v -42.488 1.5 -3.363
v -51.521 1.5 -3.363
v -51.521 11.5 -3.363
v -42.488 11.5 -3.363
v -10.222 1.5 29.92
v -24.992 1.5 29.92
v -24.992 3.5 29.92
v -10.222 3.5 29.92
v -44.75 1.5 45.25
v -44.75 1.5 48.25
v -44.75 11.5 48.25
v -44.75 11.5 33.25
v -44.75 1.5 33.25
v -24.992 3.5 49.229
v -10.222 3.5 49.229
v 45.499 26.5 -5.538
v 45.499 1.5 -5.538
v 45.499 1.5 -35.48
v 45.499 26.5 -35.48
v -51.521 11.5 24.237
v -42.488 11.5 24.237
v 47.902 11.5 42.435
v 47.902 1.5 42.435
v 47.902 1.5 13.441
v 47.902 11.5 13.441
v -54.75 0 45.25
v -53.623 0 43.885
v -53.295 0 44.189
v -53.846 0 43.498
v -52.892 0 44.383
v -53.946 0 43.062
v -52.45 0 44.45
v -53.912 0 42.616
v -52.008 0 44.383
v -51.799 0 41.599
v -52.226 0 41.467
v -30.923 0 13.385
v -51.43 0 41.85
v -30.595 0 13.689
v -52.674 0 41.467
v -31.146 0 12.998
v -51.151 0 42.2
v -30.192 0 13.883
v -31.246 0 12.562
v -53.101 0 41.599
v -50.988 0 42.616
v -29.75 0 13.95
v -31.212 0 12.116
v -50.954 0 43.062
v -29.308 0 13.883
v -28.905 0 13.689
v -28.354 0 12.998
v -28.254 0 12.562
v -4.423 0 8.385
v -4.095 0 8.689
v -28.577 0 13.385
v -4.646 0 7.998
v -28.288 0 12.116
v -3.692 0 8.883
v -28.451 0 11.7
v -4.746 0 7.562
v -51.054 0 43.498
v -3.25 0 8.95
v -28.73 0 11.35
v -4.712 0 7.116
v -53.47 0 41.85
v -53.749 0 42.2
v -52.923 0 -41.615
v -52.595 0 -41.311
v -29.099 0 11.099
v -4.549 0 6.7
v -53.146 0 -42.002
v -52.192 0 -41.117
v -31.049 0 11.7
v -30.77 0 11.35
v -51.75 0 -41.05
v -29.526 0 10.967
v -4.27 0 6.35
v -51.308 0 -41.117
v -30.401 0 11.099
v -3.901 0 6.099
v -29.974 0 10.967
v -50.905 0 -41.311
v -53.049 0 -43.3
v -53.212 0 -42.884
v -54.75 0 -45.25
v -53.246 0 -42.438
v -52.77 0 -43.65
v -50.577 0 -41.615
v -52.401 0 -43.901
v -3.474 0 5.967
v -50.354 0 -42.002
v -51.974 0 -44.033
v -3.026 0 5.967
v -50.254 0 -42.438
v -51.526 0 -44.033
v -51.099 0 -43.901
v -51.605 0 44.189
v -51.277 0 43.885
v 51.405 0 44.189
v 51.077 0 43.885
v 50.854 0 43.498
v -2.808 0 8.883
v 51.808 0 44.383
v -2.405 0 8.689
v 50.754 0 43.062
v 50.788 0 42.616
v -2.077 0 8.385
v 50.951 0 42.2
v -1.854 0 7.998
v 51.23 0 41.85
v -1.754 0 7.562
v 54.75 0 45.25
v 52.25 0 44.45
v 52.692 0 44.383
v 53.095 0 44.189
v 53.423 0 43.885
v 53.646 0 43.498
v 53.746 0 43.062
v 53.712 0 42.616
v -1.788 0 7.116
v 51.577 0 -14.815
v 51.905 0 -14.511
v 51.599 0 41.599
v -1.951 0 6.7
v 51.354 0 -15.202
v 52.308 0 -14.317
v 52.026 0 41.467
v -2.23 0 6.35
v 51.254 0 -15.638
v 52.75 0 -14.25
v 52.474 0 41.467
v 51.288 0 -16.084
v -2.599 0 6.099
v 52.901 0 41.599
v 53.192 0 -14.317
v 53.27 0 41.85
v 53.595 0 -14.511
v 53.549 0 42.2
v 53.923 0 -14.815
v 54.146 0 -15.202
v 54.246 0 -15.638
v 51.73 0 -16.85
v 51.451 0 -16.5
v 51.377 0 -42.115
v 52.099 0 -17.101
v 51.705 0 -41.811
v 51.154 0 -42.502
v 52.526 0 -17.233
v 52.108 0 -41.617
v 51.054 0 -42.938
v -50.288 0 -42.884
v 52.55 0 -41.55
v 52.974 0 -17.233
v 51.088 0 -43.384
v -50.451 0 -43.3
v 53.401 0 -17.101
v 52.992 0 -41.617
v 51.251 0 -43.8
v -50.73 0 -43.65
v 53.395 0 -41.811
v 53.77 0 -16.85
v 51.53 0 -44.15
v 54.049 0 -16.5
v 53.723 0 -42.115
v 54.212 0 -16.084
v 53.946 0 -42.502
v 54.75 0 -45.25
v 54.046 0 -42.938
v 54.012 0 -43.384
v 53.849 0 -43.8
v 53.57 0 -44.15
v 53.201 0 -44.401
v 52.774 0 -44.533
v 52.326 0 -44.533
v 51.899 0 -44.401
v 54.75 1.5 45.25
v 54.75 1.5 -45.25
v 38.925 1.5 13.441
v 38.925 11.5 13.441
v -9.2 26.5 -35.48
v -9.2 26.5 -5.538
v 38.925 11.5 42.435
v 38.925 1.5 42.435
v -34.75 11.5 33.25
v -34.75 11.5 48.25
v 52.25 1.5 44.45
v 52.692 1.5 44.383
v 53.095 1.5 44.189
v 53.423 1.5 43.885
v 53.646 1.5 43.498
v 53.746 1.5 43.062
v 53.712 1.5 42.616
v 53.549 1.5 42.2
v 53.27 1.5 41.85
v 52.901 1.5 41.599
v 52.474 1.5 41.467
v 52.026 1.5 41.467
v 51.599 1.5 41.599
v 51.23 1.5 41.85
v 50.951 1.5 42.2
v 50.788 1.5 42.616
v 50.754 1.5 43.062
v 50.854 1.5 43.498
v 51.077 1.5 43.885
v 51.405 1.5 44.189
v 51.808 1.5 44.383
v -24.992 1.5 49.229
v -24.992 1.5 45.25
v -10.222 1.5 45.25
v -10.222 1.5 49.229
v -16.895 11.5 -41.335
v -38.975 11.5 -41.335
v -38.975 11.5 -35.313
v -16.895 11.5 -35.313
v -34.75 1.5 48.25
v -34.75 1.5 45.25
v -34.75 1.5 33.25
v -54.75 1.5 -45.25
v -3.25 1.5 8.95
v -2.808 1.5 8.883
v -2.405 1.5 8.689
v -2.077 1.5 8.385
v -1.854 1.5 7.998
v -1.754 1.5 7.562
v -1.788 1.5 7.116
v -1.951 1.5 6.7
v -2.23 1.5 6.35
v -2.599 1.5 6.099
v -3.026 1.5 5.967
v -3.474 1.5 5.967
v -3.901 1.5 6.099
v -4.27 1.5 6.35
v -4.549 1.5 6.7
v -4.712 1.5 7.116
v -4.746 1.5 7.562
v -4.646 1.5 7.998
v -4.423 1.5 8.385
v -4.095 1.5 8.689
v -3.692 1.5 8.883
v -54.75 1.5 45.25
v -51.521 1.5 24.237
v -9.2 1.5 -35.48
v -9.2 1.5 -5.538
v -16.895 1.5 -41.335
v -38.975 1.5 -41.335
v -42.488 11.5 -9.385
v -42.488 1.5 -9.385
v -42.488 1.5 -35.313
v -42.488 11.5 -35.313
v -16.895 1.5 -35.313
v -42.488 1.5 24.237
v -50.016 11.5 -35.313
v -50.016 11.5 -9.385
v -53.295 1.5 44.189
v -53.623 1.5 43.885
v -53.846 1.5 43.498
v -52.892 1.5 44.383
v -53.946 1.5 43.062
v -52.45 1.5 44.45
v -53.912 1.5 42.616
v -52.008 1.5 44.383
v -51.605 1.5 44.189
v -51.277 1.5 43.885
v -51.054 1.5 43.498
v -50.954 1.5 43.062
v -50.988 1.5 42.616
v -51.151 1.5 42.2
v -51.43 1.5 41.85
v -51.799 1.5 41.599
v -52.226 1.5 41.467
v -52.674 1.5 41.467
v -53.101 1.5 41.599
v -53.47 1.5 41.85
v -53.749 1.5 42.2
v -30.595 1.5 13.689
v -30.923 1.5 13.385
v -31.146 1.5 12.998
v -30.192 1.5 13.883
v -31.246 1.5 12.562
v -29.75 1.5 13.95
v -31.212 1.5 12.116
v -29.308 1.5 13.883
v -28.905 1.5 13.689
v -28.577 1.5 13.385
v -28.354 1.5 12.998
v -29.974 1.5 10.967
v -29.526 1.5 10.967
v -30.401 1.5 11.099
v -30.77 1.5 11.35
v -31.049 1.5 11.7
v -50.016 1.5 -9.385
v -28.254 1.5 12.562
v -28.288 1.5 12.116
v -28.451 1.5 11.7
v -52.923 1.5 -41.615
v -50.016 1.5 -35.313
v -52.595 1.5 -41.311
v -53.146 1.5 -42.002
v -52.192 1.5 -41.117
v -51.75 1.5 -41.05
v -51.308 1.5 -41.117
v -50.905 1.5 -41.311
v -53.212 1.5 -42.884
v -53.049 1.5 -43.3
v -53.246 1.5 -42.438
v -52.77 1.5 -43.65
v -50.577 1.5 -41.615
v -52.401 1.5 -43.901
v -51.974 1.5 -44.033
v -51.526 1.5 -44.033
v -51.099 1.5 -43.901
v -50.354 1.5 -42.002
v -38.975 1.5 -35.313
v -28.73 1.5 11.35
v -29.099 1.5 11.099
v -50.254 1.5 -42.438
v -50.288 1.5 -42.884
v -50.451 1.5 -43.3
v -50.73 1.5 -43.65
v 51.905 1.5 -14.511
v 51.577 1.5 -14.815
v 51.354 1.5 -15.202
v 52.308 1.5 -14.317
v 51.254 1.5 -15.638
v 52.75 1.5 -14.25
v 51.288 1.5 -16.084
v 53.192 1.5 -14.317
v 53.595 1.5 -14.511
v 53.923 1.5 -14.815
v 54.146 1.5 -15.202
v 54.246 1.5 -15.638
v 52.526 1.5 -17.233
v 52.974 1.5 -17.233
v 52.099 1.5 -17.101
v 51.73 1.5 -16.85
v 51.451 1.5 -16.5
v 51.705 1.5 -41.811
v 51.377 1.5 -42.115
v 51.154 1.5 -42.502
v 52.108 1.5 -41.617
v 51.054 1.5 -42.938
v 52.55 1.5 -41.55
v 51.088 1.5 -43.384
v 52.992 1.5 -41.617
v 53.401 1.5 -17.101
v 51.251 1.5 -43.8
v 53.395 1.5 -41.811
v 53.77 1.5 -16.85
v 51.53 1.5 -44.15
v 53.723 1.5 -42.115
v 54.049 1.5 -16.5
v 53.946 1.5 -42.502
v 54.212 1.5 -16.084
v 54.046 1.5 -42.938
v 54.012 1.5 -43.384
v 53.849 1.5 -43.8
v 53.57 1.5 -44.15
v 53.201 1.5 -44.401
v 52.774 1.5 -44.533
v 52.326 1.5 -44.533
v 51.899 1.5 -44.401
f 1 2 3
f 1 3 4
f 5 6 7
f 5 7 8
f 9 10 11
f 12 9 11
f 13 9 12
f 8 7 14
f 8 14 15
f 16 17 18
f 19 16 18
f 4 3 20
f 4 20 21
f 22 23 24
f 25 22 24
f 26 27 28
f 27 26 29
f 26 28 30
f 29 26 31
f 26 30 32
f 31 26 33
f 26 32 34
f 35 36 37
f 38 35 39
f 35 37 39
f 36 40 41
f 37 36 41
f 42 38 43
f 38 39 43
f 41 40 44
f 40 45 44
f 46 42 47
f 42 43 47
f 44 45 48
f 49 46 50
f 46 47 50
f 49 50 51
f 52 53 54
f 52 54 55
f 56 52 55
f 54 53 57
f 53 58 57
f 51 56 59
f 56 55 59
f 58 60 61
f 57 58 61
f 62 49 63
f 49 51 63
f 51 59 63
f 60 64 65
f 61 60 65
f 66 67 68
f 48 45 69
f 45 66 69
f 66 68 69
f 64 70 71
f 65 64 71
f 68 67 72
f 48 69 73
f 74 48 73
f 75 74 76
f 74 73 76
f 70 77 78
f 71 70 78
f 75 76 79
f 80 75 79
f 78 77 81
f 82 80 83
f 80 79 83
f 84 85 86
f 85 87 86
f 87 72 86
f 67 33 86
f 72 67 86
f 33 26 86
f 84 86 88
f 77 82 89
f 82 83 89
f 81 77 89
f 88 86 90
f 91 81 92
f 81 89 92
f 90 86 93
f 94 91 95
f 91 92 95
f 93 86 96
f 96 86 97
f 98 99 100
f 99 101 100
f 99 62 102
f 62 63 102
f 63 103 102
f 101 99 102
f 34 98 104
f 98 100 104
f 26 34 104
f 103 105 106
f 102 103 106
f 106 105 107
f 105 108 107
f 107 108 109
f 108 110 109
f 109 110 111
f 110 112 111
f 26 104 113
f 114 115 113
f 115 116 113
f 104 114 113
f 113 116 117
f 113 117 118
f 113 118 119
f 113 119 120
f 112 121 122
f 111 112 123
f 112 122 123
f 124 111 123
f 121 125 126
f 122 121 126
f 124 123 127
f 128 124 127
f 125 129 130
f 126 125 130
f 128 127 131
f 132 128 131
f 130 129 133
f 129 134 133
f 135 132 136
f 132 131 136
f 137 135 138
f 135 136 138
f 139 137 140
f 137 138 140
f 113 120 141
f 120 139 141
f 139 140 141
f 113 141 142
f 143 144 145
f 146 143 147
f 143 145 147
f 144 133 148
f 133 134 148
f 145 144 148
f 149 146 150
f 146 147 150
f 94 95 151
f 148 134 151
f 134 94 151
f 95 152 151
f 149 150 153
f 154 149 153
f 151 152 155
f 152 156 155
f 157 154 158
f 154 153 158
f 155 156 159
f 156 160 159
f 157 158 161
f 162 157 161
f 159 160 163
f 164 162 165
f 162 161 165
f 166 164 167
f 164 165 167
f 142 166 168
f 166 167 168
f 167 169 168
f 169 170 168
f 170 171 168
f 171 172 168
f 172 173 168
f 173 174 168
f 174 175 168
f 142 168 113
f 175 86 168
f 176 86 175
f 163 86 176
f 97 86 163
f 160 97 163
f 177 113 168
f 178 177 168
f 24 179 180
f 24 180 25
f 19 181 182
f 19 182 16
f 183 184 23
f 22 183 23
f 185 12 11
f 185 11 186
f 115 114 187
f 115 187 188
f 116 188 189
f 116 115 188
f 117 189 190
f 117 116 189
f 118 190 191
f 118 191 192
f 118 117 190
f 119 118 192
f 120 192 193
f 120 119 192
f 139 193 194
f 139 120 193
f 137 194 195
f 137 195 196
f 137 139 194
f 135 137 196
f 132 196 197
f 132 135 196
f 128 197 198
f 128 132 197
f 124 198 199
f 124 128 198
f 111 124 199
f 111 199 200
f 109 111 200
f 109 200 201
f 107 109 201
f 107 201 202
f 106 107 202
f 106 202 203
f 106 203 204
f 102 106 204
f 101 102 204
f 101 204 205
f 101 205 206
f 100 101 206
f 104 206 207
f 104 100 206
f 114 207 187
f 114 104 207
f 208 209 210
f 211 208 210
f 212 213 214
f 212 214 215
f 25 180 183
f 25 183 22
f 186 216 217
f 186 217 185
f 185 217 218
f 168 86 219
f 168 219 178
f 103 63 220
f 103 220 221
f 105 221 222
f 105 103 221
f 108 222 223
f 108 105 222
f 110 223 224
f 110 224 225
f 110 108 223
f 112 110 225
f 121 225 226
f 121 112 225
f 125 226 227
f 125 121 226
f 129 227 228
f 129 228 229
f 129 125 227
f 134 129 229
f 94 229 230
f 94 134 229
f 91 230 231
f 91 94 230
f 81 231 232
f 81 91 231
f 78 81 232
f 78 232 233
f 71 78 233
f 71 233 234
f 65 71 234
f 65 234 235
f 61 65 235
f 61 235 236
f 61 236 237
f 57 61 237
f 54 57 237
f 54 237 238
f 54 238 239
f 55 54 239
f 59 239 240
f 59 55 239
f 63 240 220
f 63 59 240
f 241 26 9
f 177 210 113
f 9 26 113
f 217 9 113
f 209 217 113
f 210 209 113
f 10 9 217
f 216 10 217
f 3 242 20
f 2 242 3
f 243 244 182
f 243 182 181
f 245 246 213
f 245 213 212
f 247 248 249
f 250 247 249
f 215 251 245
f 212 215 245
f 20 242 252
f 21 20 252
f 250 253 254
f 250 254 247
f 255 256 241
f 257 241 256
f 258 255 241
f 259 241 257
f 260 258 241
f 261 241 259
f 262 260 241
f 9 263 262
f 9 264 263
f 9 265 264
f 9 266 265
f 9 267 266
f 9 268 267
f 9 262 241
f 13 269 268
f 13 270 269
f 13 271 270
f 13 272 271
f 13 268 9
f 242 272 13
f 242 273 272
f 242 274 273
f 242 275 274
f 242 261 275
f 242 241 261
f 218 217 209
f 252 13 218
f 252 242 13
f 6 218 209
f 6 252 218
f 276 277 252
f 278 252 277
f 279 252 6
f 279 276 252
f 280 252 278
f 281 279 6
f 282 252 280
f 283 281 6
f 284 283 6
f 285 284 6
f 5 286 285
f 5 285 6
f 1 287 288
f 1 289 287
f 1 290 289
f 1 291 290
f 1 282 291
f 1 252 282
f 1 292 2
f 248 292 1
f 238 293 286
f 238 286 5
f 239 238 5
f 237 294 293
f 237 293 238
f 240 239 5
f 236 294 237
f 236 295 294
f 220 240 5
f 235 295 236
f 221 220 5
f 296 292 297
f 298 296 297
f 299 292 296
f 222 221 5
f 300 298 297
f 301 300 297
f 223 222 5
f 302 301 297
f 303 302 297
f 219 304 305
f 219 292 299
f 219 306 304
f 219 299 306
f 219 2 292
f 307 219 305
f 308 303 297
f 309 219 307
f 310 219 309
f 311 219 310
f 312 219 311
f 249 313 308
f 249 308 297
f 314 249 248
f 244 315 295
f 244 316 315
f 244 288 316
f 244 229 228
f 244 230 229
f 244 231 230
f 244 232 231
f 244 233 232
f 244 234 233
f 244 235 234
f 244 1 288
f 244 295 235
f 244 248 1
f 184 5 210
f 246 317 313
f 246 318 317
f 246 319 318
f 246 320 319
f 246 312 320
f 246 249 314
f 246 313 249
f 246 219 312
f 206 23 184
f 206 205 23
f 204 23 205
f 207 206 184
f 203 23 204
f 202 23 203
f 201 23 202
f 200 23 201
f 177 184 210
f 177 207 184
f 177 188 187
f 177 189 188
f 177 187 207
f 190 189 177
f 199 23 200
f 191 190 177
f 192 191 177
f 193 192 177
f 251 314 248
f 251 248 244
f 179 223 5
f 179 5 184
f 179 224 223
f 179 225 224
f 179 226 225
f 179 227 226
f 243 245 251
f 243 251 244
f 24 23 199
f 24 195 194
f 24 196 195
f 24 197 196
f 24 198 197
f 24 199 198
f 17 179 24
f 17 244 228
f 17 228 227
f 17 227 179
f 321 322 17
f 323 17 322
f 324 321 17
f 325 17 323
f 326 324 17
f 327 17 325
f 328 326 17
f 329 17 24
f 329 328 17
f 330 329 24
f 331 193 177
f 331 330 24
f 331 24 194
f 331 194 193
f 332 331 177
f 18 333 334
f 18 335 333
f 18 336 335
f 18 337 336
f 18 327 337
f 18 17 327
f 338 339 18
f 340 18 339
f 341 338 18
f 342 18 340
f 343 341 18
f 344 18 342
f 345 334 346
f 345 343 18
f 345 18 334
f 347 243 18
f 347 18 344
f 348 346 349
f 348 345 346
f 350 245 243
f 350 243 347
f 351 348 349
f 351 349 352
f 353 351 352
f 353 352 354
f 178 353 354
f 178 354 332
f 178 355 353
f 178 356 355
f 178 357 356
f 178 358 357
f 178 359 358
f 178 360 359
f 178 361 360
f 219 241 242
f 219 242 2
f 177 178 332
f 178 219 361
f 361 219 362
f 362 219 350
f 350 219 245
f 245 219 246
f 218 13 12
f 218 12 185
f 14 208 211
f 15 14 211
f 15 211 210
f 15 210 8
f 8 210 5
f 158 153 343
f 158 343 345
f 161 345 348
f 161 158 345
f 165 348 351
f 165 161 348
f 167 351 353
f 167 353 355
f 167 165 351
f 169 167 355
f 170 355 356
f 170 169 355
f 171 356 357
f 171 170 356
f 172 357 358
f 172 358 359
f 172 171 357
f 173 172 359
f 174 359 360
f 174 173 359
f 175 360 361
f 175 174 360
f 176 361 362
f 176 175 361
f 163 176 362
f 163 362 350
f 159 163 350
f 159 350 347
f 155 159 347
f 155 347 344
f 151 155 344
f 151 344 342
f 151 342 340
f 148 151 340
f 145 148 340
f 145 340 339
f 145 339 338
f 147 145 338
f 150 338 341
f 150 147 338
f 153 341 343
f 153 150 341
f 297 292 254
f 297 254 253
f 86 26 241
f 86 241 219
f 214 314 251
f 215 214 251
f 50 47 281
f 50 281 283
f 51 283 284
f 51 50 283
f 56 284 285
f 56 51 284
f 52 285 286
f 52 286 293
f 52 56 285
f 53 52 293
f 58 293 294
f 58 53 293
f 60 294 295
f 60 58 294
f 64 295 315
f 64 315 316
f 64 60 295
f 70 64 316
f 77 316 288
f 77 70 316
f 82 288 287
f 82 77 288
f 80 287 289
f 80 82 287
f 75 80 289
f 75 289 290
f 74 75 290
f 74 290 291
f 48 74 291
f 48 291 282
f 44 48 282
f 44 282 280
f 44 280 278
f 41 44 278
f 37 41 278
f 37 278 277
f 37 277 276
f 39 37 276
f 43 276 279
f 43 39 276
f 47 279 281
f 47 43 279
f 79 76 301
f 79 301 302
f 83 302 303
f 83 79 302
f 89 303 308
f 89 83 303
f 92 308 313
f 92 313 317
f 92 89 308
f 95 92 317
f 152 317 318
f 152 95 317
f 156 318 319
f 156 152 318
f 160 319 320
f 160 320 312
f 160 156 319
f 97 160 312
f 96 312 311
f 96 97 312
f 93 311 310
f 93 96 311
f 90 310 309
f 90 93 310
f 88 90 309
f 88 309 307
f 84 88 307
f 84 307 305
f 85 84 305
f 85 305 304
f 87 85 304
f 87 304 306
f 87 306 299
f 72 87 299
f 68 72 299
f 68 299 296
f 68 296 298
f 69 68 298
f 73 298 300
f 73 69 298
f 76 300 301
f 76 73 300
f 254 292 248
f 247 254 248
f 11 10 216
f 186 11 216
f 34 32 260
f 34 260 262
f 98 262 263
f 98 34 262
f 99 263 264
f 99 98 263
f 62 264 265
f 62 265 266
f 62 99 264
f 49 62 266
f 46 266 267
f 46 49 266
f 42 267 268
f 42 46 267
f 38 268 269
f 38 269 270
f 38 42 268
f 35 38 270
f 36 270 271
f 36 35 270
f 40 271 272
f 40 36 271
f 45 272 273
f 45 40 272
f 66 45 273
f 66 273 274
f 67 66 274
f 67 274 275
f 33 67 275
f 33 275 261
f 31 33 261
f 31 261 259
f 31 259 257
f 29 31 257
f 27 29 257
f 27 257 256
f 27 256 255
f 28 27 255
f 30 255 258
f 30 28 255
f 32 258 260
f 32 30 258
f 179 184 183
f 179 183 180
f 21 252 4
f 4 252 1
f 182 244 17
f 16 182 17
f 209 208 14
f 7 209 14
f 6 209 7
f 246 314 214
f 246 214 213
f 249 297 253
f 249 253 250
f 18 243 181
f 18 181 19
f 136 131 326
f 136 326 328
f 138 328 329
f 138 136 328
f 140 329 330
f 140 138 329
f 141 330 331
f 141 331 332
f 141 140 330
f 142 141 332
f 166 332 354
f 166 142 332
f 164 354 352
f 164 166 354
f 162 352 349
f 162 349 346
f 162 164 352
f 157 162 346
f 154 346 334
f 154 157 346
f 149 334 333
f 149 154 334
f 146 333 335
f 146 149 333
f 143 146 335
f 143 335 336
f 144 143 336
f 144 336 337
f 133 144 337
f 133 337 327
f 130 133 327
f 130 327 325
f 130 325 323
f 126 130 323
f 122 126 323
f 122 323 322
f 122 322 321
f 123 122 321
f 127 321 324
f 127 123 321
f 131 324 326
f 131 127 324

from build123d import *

# Parameters (mm, degrees)
SKETCH1_W           = 109.5
SKETCH1_H           = 90.5
SKETCH1_R           = 1.5
BOSS_EXTRUDE1_DEPTH = 1.5
SKETCH2_W           = 10
SKETCH2_H           = 15
BOSS_EXTRUDE2_DEPTH = 10
SKETCH3_W           = 14.7696301
SKETCH3_H           = 19.309368961
BOSS_EXTRUDE3_DEPTH = 2
SKETCH4_W           = 54.699442022
SKETCH4_H           = 29.942508018
BOSS_EXTRUDE4_DEPTH = 25
SKETCH5_W           = 9.03293538
SKETCH5_H           = 27.600635882
SKETCH5_W_2         = 7.52744615
SKETCH5_H_2         = 25.927870071
SKETCH5_W_3         = 22.080508706
SKETCH5_H_3         = 6.02195692
SKETCH5_W_4         = 8.97656987
SKETCH5_H_4         = 28.994339973
BOSS_EXTRUDE5_DEPTH = 10


with BuildPart() as part:
    # Sketch1 → Boss-Extrude1 (new body)
    with BuildSketch(Plane(origin=(0, 0, 0), x_dir=(1, 0, 0), z_dir=(0, 1, 0))):
        Rectangle(SKETCH1_W, SKETCH1_H)
        with Locations(Location((-52.45, -42.95, 0), (0, 0, 270))):
            Circle(SKETCH1_R, mode=Mode.SUBTRACT)
        with Locations(Location((-29.75, -12.45, 0), (0, 0, 270))):
            Circle(SKETCH1_R, mode=Mode.SUBTRACT)
        with Locations(Location((52.25, -42.95, 0), (0, 0, 270))):
            Circle(SKETCH1_R, mode=Mode.SUBTRACT)
        with Locations(Location((52.55, 43.05, 0), (0, 0, 270))):
            Circle(SKETCH1_R, mode=Mode.SUBTRACT)
        with Locations(Location((-51.75, 42.55, 0), (0, 0, 270))):
            Circle(SKETCH1_R, mode=Mode.SUBTRACT)
        with Locations(Location((-3.25, -7.45, 0), (0, 0, 270))):
            Circle(SKETCH1_R, mode=Mode.SUBTRACT)
        with Locations(Location((52.75, 15.75, 0), (0, 0, 270))):
            Circle(SKETCH1_R, mode=Mode.SUBTRACT)
    extrude(amount=BOSS_EXTRUDE1_DEPTH)

    # Sketch2 → Boss-Extrude2 (add)
    with BuildSketch(Plane(origin=(0, 1.5, 0), x_dir=(1, 0, 0), z_dir=(0, 1, 0))):
        with Locations((-39.75, -40.75)):
            Rectangle(SKETCH2_W, SKETCH2_H)
    extrude(amount=BOSS_EXTRUDE2_DEPTH)

    # Sketch3 → Boss-Extrude3 (add)
    with BuildSketch(Plane(origin=(0, 1.5, 0), x_dir=(1, 0, 0), z_dir=(0, 1, 0))):
        with Locations((-17.607300973, -39.57462345)):
            Rectangle(SKETCH3_W, SKETCH3_H)
    extrude(amount=BOSS_EXTRUDE3_DEPTH)

    # Sketch4 → Boss-Extrude4 (add)
    with BuildSketch(Plane(origin=(0, 1.5, 0), x_dir=(1, 0, 0), z_dir=(0, 1, 0))):
        with Locations((18.14950905, 20.509046194)):
            Rectangle(SKETCH4_W, SKETCH4_H)
    extrude(amount=BOSS_EXTRUDE4_DEPTH)

    # Sketch5 → Boss-Extrude5 (add)
    with BuildSketch(Plane(origin=(0, 1.5, 0), x_dir=(1, 0, 0), z_dir=(0, 1, 0))):
        with Locations((-47.004719291, -10.437121311)):
            Rectangle(SKETCH5_W, SKETCH5_H)
        with Locations((-46.251974676, 22.349088585)):
            Rectangle(SKETCH5_W_2, SKETCH5_H_2)
        with Locations((-27.935189045, 38.324002081)):
            Rectangle(SKETCH5_W_3, SKETCH5_H_3)
        with Locations((43.413693804, -27.937937952)):
            Rectangle(SKETCH5_W_4, SKETCH5_H_4)
    extrude(amount=BOSS_EXTRUDE5_DEPTH)


solid = part.part
